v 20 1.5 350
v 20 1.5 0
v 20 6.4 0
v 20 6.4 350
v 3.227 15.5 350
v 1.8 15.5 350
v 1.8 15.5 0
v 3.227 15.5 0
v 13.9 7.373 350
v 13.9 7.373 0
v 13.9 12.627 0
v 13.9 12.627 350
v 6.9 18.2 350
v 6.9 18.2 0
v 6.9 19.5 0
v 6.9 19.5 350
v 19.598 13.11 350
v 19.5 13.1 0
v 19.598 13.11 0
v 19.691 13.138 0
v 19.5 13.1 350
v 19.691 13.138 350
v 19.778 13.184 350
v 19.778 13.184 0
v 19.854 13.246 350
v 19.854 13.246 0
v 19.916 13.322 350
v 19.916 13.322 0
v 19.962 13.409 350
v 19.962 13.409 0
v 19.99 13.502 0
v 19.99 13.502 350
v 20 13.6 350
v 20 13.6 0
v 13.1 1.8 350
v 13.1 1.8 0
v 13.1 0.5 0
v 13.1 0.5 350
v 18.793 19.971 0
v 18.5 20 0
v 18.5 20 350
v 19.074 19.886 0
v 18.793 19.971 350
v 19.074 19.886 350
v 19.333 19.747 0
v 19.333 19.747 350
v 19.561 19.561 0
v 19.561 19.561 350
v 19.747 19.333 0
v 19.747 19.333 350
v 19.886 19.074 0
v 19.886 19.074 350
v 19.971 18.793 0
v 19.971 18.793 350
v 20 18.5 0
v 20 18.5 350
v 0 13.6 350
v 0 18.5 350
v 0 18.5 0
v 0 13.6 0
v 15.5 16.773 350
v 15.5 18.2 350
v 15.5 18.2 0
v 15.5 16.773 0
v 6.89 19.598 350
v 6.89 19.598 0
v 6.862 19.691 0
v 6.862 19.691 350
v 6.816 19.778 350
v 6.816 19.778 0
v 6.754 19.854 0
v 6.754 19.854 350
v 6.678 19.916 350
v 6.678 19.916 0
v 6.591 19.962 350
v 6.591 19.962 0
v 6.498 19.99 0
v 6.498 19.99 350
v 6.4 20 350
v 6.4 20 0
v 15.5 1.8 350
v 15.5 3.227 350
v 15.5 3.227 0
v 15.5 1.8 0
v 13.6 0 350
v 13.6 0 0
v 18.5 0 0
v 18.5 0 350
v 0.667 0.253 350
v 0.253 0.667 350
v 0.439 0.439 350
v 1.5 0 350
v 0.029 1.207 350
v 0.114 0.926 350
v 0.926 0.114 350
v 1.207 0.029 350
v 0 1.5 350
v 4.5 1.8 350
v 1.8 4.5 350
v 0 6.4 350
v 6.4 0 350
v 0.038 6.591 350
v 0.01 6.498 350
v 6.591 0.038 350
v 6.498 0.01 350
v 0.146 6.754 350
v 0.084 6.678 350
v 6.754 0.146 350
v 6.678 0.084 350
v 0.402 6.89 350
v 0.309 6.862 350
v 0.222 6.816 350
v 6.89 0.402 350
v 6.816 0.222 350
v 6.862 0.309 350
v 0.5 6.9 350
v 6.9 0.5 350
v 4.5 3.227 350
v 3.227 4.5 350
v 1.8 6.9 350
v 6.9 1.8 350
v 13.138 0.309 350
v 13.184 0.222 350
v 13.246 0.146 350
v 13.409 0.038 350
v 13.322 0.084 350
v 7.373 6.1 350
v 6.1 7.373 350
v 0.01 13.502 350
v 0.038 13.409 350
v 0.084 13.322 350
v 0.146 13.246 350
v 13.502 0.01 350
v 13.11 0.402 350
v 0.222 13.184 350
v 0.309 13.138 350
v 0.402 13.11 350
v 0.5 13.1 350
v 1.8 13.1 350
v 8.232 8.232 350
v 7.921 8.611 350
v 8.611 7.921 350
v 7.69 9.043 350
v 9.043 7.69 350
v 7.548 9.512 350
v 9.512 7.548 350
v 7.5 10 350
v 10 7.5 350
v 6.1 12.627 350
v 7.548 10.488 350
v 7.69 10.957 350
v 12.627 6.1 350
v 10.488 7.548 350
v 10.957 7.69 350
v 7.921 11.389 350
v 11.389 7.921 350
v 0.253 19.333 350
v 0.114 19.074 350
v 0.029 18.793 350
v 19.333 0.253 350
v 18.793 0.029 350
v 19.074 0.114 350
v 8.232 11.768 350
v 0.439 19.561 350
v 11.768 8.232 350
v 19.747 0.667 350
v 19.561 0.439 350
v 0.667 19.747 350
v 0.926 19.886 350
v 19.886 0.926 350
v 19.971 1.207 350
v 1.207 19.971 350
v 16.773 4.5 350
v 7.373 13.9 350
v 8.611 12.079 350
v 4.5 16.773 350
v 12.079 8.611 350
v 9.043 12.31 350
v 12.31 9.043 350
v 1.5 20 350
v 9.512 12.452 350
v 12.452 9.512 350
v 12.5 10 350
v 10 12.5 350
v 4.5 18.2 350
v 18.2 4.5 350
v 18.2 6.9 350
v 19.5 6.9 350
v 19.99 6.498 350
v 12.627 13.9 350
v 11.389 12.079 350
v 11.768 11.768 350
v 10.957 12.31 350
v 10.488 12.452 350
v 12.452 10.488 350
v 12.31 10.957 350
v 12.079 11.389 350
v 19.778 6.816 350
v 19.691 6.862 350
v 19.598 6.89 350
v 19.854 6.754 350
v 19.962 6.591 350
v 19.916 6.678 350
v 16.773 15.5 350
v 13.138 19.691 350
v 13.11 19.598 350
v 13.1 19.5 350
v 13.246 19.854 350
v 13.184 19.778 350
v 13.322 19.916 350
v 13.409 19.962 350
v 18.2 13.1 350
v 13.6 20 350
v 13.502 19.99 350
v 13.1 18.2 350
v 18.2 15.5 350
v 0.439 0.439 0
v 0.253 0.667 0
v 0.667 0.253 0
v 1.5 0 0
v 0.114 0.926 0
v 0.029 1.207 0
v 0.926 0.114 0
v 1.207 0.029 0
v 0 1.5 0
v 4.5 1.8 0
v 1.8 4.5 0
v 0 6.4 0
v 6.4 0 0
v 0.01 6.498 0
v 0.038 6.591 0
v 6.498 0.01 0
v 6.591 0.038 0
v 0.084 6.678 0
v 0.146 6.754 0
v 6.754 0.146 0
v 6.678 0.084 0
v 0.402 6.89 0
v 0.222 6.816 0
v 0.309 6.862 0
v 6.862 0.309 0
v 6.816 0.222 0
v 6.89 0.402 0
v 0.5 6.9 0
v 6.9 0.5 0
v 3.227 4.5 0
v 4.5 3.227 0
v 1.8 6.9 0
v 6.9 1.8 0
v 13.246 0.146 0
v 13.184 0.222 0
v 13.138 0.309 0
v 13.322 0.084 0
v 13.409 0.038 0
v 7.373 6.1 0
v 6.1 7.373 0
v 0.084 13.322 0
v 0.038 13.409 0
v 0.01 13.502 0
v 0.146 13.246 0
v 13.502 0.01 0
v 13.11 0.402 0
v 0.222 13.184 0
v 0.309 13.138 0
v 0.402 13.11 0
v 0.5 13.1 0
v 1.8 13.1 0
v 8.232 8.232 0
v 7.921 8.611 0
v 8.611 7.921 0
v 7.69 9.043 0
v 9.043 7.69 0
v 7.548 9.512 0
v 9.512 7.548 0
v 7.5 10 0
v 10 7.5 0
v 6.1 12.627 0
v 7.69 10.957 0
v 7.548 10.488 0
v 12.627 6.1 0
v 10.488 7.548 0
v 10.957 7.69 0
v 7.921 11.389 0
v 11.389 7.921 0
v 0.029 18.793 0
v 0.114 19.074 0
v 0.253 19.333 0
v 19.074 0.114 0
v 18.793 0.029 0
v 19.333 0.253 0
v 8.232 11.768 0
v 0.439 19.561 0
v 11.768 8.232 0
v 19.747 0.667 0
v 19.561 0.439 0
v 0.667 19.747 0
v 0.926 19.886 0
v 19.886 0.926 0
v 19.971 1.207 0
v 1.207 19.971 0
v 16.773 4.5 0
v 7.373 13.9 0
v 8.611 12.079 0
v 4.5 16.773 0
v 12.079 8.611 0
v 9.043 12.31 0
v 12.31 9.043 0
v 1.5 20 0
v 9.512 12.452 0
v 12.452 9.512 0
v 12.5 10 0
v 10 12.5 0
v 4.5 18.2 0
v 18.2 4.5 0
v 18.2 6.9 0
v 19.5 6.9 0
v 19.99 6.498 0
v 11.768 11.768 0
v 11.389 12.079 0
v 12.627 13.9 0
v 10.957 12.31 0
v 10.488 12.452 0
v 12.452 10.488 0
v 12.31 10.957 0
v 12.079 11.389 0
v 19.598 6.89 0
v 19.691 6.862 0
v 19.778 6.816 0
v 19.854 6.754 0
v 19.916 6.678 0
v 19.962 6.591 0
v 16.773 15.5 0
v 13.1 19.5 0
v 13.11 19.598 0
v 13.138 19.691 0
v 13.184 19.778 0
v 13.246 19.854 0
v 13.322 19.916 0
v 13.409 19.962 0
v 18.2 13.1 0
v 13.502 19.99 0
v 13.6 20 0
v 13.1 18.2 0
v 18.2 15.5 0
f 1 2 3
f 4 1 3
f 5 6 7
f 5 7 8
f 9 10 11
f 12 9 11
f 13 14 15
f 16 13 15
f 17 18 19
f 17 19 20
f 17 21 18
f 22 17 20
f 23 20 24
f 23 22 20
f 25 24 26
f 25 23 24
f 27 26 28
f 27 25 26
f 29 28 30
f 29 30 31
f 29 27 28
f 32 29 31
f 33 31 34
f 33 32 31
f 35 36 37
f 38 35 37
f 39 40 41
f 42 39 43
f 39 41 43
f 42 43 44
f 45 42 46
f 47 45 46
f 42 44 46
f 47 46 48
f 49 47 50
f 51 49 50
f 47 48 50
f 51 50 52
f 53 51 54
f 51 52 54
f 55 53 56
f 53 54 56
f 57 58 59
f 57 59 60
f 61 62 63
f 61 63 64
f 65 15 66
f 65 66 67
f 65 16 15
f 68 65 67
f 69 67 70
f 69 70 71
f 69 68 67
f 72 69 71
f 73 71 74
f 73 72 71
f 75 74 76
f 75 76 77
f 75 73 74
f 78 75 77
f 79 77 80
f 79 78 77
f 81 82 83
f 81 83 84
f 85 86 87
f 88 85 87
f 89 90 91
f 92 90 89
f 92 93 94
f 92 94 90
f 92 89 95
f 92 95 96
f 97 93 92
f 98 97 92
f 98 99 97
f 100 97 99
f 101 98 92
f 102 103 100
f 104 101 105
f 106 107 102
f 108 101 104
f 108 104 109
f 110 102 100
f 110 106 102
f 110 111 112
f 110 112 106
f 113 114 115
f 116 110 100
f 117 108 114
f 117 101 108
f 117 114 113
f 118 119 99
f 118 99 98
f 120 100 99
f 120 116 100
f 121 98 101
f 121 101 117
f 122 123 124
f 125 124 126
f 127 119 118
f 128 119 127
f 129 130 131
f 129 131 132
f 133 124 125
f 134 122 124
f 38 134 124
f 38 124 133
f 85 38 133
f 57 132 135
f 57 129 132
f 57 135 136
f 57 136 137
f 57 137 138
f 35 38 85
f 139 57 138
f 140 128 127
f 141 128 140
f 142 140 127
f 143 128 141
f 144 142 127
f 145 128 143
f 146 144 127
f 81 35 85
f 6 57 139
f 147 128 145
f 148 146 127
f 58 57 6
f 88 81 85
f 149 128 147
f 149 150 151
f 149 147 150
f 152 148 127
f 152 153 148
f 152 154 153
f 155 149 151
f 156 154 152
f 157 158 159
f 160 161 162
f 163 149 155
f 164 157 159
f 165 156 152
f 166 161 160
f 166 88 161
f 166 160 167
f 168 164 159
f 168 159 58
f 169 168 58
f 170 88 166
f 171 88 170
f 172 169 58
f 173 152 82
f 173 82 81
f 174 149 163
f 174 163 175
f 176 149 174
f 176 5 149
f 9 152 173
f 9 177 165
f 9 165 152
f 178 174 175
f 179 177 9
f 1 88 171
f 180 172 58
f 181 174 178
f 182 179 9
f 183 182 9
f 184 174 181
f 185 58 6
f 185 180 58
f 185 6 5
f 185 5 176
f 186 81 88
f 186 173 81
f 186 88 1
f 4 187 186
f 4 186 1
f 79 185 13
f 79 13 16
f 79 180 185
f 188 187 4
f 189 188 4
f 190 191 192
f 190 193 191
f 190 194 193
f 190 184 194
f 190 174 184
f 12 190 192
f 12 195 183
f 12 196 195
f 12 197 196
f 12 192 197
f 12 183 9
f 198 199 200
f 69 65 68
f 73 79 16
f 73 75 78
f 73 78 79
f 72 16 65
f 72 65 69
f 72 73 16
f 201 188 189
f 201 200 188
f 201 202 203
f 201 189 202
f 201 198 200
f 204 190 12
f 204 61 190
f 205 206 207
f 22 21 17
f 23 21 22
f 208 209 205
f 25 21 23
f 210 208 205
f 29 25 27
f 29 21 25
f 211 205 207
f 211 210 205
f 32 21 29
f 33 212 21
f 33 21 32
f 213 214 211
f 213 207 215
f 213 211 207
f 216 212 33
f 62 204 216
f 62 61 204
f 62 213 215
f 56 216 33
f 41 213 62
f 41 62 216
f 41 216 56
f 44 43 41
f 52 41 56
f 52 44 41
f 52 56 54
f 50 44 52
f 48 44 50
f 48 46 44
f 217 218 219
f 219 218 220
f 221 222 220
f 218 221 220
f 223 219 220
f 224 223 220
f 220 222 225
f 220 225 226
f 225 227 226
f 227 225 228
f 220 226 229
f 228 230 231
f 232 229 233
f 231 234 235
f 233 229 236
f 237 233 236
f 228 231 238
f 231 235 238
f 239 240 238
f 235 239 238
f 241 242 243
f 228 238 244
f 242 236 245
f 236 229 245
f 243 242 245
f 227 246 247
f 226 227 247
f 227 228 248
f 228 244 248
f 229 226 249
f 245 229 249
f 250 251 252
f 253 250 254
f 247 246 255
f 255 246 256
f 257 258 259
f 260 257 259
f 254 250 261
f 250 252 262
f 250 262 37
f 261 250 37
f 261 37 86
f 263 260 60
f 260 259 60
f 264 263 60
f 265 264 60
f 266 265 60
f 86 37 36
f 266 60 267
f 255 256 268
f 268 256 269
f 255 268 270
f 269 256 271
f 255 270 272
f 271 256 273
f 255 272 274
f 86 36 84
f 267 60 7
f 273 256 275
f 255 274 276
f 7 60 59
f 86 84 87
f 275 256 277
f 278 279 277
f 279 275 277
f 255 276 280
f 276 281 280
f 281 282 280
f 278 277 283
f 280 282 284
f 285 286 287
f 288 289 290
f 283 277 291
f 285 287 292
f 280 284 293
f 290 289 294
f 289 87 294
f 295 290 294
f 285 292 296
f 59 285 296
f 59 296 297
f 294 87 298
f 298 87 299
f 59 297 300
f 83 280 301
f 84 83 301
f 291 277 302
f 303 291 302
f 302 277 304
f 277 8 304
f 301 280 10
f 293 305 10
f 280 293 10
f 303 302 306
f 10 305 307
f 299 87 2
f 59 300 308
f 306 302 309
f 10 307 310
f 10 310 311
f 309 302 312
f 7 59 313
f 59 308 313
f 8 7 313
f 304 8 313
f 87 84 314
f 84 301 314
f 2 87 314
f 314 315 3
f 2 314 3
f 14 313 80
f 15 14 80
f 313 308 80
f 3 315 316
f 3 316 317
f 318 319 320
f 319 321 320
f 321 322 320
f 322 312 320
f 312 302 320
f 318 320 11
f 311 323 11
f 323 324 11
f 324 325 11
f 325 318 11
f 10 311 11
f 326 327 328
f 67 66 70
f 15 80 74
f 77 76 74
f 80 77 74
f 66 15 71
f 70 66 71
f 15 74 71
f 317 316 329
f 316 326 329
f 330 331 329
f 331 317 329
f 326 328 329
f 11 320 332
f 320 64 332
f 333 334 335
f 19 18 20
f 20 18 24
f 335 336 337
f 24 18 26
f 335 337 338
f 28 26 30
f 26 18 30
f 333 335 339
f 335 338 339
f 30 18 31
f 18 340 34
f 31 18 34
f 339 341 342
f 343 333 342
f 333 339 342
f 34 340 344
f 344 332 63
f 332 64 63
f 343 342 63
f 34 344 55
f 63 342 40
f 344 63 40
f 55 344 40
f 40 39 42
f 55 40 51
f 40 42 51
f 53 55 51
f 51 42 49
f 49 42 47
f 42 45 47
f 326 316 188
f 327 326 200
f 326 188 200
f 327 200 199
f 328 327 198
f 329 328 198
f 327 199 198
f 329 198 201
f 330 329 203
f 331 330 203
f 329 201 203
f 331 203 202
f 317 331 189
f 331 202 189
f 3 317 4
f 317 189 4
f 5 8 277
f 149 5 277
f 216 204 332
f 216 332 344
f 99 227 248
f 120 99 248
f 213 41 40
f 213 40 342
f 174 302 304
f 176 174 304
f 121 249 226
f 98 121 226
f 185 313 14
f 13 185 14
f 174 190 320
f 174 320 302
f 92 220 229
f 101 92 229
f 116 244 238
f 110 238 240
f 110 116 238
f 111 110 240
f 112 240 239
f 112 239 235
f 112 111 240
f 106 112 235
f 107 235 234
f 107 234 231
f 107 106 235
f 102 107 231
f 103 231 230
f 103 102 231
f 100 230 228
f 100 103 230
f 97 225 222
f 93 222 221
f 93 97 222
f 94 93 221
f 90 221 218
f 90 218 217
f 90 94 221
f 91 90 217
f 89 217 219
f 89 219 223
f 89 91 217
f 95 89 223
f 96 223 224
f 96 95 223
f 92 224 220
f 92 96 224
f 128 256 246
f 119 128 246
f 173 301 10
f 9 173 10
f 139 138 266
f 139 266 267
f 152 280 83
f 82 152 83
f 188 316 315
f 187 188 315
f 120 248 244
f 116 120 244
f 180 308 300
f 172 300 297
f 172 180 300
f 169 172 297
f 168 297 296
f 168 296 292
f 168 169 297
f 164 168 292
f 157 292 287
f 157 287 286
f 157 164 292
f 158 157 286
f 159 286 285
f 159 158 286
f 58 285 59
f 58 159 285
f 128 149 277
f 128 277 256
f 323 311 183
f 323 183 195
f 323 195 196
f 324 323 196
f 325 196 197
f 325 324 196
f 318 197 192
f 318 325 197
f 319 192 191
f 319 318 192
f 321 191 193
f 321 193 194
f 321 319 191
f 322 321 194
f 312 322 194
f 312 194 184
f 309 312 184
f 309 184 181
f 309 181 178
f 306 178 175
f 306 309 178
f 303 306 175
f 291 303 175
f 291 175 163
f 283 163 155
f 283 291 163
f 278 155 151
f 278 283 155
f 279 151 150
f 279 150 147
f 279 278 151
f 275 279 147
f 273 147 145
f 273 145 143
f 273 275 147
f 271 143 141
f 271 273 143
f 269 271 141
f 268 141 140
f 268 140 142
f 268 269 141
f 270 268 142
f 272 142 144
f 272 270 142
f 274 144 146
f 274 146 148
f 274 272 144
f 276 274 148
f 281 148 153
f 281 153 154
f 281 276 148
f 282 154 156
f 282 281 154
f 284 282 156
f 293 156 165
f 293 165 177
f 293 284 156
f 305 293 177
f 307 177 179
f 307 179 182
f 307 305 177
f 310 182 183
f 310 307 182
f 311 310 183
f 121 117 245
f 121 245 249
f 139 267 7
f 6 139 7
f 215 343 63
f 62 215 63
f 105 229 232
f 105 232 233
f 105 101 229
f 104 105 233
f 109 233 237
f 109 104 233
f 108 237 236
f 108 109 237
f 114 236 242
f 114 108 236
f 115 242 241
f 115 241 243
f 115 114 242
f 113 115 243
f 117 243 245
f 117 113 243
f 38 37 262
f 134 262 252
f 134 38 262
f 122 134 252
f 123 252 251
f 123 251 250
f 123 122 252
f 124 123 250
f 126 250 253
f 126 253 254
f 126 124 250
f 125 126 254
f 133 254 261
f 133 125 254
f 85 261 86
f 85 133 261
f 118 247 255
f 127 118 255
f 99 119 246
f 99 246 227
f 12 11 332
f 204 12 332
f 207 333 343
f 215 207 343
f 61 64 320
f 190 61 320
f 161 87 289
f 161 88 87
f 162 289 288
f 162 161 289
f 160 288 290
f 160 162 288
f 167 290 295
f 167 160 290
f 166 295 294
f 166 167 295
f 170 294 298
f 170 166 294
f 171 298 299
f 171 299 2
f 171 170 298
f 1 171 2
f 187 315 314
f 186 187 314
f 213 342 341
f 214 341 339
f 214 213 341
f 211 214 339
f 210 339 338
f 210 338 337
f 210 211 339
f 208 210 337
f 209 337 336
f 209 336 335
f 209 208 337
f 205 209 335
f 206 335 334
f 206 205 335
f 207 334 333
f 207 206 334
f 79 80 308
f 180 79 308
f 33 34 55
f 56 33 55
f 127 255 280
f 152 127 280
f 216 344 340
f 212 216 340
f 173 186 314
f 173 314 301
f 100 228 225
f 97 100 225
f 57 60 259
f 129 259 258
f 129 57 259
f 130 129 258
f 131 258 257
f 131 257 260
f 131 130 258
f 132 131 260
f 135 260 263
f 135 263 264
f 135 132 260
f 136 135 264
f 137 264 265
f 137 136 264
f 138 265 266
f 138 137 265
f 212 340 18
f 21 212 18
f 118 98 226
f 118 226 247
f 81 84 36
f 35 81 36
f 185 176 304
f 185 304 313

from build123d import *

# Parameters (mm, degrees)
SKETCH_1_R      = 2.5
EXTRUDE_1_DEPTH = 350
FILLET_1_R      = 1.5
FILLET_2_R      = 1.5
FILLET_3_R      = 1.5
FILLET_4_R      = 1.5
FILLET_5_R      = 0.5
FILLET_6_R      = 0.5
FILLET_7_R      = 0.5
FILLET_8_R      = 0.5
FILLET_9_R      = 0.5
FILLET_10_R     = 0.5
FILLET_11_R     = 0.5
FILLET_12_R     = 0.5


with BuildPart() as part:
    # 草图1 → 凸台-拉伸1 (new body)
    with BuildSketch(Plane.XY):
        Polygon((0, 6.9), (0, 0), (6.9, 0), (6.9, 1.8), (4.5, 1.8), (4.5, 3.227207794), (7.372792206, 6.1), (12.627207794, 6.1), (15.5, 3.227207794), (15.5, 1.8), (13.1, 1.8), (13.1, 0), (20, 0), (20, 6.9), (18.2, 6.9), (18.2, 4.5), (16.772792206, 4.5), (13.9, 7.372792206), (13.9, 12.627207794), (16.772792206, 15.5), (18.2, 15.5), (18.2, 13.1), (20, 13.1), (20, 20), (13.1, 20), (13.1, 18.2), (15.5, 18.2), (15.5, 16.772792206), (12.627207794, 13.9), (7.372792206, 13.9), (4.5, 16.772792206), (4.5, 18.2), (6.9, 18.2), (6.9, 20), (0, 20), (0, 13.1), (1.8, 13.1), (1.8, 15.5), (3.227207794, 15.5), (6.1, 12.627207794), (6.1, 7.372792206), (3.227207794, 4.5), (1.8, 4.5), (1.8, 6.9), align=None)
        with Locations((10, 10)):
            Circle(SKETCH_1_R, mode=Mode.SUBTRACT)
    extrude(amount=EXTRUDE_1_DEPTH)

    # 圆角1
    fillet_1_edges = [part.edges().sort_by_distance(p)[0] for p in [
        (20, 20, 175),
    ]]
    fillet(fillet_1_edges, radius=FILLET_1_R)

    # 圆角2
    fillet_2_edges = [part.edges().sort_by_distance(p)[0] for p in [
        (0, 20, 175),
    ]]
    fillet(fillet_2_edges, radius=FILLET_2_R)

    # 圆角3
    fillet_3_edges = [part.edges().sort_by_distance(p)[0] for p in [
        (0, 0, 175),
    ]]
    fillet(fillet_3_edges, radius=FILLET_3_R)

    # 圆角4
    fillet_4_edges = [part.edges().sort_by_distance(p)[0] for p in [
        (20, 0, 175),
    ]]
    fillet(fillet_4_edges, radius=FILLET_4_R)

    # 圆角5
    fillet_5_edges = [part.edges().sort_by_distance(p)[0] for p in [
        (13.1, 20, 175),
    ]]
    fillet(fillet_5_edges, radius=FILLET_5_R)

    # 圆角6
    fillet_6_edges = [part.edges().sort_by_distance(p)[0] for p in [
        (6.9, 20, 175),
    ]]
    fillet(fillet_6_edges, radius=FILLET_6_R)

    # 圆角7
    fillet_7_edges = [part.edges().sort_by_distance(p)[0] for p in [
        (0, 13.1, 175),
    ]]
    fillet(fillet_7_edges, radius=FILLET_7_R)

    # 圆角8
    fillet_8_edges = [part.edges().sort_by_distance(p)[0] for p in [
        (0, 6.9, 175),
    ]]
    fillet(fillet_8_edges, radius=FILLET_8_R)

    # 圆角9
    fillet_9_edges = [part.edges().sort_by_distance(p)[0] for p in [
        (6.9, 0, 175),
    ]]
    fillet(fillet_9_edges, radius=FILLET_9_R)

    # 圆角10
    fillet_10_edges = [part.edges().sort_by_distance(p)[0] for p in [
        (13.1, 0, 175),
    ]]
    fillet(fillet_10_edges, radius=FILLET_10_R)

    # 圆角11
    fillet_11_edges = [part.edges().sort_by_distance(p)[0] for p in [
        (20, 13.1, 175),
    ]]
    fillet(fillet_11_edges, radius=FILLET_11_R)

    # 圆角12
    fillet_12_edges = [part.edges().sort_by_distance(p)[0] for p in [
        (20, 6.9, 175),
    ]]
    fillet(fillet_12_edges, radius=FILLET_12_R)


solid = part.part
